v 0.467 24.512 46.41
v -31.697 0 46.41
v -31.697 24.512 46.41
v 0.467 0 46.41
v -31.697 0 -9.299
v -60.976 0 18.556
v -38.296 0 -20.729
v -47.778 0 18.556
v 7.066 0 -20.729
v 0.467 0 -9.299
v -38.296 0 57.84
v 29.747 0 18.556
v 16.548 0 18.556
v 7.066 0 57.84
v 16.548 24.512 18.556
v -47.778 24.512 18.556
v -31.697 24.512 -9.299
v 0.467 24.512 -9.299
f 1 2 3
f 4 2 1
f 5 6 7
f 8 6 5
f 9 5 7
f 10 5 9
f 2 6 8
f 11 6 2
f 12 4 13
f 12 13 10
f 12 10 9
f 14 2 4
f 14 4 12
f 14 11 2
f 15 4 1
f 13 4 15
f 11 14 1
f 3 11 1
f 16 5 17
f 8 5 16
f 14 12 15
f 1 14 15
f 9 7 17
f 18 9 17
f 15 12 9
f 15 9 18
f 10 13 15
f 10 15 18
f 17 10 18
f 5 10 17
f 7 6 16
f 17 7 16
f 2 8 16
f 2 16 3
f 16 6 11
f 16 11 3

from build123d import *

# Parameters (mm, degrees)
F1_DEPTH    = 25.4
F2_T1_DEPTH = 176.9830394525
F2_T3_DEPTH = 176.9830394525
F2_T5_DEPTH = 176.9830394525
F2_T7_DEPTH = 176.9830394525
F2_T9_DEPTH = 176.9830394525


# Not quite as in the source:
# - a fillet or chamfer that OpenCascade refuses, or shapes differently, is made with other operations: its cross-section is extruded or revolved along the edge and cut away or added


with BuildPart() as f1:
    # F0 (on Front) → F1 (new body)
    with BuildSketch(Plane.XZ):
        Polygon((7.0658522586, 57.8397729191), (-38.2956332455, 57.8397729191), (-60.9763759976, 18.5555741191), (-38.2956332455, -20.7286246809), (7.0658522586, -20.7286246809), (29.7465950107, 18.5555741191), align=None)
        Polygon((16.548367857, 18.5555741191), (0.4667386818, -9.2986246809), (-31.6965196687, -9.2986246809), (-47.7781488439, 18.5555741191), (-31.6965196687, 46.4097729191), (0.4667386818, 46.4097729191), align=None, mode=Mode.SUBTRACT)
    extrude(amount=-F1_DEPTH)

    # F2: chamfer of 25.4 x 11.8442145171 on 6 edges, made by hand

    # F2_s2 → F2_t1 (cut)
    with BuildSketch(Plane.YZ.offset(-104.1064102197)):
        Polygon((0, 57.8397729191), (25.4, 45.995558402), (25.4, 57.8397729191), align=None)
        Polygon((0, -20.7286246809), (25.4, -8.8844101638), (25.4, -20.7286246809), align=None)
    extrude(amount=F2_T1_DEPTH, mode=Mode.SUBTRACT)

    # F2_s4 → F2_t3 (cut)
    with BuildSketch(Plane(origin=(48.3768365242, 0, 83.7911387694), x_dir=(0, 1, 0), z_dir=(-0.5, 0, -0.8660254038))):
        Polygon((0, -62.0848777042), (25.4, -50.2406631871), (25.4, -62.0848777042), align=None)
    extrude(amount=F2_T3_DEPTH, mode=Mode.SUBTRACT)

    # F2_s6 → F2_t5 (cut)
    with BuildSketch(Plane(origin=(32.3072379553, 0, -55.9577775908), x_dir=(0, 1, 0), z_dir=(-0.5, 0, 0.8660254038))):
        Polygon((0, -35.0390940149), (25.4, -23.1948794978), (25.4, -35.0390940149), align=None)
    extrude(amount=F2_T5_DEPTH, mode=Mode.SUBTRACT)

    # F2_s8 → F2_t7 (cut)
    with BuildSketch(Plane(origin=(-40.114683202, 0, -69.4806694354), x_dir=(0, 1, 0), z_dir=(0.5, 0, 0.8660254038))):
        Polygon((0, -16.4835198958), (25.4, -4.6393053787), (25.4, -16.4835198958), align=None)
    extrude(amount=F2_T7_DEPTH, mode=Mode.SUBTRACT)

    # F2_s10 → F2_t9 (cut)
    with BuildSketch(Plane(origin=(-56.184281771, 0, 97.3140306141), x_dir=(0, 1, 0), z_dir=(0.5, 0, -0.8660254038))):
        Polygon((0, -43.5293035851), (25.4, -31.685089068), (25.4, -43.5293035851), align=None)
    extrude(amount=F2_T9_DEPTH, mode=Mode.SUBTRACT)


solid = f1.part
